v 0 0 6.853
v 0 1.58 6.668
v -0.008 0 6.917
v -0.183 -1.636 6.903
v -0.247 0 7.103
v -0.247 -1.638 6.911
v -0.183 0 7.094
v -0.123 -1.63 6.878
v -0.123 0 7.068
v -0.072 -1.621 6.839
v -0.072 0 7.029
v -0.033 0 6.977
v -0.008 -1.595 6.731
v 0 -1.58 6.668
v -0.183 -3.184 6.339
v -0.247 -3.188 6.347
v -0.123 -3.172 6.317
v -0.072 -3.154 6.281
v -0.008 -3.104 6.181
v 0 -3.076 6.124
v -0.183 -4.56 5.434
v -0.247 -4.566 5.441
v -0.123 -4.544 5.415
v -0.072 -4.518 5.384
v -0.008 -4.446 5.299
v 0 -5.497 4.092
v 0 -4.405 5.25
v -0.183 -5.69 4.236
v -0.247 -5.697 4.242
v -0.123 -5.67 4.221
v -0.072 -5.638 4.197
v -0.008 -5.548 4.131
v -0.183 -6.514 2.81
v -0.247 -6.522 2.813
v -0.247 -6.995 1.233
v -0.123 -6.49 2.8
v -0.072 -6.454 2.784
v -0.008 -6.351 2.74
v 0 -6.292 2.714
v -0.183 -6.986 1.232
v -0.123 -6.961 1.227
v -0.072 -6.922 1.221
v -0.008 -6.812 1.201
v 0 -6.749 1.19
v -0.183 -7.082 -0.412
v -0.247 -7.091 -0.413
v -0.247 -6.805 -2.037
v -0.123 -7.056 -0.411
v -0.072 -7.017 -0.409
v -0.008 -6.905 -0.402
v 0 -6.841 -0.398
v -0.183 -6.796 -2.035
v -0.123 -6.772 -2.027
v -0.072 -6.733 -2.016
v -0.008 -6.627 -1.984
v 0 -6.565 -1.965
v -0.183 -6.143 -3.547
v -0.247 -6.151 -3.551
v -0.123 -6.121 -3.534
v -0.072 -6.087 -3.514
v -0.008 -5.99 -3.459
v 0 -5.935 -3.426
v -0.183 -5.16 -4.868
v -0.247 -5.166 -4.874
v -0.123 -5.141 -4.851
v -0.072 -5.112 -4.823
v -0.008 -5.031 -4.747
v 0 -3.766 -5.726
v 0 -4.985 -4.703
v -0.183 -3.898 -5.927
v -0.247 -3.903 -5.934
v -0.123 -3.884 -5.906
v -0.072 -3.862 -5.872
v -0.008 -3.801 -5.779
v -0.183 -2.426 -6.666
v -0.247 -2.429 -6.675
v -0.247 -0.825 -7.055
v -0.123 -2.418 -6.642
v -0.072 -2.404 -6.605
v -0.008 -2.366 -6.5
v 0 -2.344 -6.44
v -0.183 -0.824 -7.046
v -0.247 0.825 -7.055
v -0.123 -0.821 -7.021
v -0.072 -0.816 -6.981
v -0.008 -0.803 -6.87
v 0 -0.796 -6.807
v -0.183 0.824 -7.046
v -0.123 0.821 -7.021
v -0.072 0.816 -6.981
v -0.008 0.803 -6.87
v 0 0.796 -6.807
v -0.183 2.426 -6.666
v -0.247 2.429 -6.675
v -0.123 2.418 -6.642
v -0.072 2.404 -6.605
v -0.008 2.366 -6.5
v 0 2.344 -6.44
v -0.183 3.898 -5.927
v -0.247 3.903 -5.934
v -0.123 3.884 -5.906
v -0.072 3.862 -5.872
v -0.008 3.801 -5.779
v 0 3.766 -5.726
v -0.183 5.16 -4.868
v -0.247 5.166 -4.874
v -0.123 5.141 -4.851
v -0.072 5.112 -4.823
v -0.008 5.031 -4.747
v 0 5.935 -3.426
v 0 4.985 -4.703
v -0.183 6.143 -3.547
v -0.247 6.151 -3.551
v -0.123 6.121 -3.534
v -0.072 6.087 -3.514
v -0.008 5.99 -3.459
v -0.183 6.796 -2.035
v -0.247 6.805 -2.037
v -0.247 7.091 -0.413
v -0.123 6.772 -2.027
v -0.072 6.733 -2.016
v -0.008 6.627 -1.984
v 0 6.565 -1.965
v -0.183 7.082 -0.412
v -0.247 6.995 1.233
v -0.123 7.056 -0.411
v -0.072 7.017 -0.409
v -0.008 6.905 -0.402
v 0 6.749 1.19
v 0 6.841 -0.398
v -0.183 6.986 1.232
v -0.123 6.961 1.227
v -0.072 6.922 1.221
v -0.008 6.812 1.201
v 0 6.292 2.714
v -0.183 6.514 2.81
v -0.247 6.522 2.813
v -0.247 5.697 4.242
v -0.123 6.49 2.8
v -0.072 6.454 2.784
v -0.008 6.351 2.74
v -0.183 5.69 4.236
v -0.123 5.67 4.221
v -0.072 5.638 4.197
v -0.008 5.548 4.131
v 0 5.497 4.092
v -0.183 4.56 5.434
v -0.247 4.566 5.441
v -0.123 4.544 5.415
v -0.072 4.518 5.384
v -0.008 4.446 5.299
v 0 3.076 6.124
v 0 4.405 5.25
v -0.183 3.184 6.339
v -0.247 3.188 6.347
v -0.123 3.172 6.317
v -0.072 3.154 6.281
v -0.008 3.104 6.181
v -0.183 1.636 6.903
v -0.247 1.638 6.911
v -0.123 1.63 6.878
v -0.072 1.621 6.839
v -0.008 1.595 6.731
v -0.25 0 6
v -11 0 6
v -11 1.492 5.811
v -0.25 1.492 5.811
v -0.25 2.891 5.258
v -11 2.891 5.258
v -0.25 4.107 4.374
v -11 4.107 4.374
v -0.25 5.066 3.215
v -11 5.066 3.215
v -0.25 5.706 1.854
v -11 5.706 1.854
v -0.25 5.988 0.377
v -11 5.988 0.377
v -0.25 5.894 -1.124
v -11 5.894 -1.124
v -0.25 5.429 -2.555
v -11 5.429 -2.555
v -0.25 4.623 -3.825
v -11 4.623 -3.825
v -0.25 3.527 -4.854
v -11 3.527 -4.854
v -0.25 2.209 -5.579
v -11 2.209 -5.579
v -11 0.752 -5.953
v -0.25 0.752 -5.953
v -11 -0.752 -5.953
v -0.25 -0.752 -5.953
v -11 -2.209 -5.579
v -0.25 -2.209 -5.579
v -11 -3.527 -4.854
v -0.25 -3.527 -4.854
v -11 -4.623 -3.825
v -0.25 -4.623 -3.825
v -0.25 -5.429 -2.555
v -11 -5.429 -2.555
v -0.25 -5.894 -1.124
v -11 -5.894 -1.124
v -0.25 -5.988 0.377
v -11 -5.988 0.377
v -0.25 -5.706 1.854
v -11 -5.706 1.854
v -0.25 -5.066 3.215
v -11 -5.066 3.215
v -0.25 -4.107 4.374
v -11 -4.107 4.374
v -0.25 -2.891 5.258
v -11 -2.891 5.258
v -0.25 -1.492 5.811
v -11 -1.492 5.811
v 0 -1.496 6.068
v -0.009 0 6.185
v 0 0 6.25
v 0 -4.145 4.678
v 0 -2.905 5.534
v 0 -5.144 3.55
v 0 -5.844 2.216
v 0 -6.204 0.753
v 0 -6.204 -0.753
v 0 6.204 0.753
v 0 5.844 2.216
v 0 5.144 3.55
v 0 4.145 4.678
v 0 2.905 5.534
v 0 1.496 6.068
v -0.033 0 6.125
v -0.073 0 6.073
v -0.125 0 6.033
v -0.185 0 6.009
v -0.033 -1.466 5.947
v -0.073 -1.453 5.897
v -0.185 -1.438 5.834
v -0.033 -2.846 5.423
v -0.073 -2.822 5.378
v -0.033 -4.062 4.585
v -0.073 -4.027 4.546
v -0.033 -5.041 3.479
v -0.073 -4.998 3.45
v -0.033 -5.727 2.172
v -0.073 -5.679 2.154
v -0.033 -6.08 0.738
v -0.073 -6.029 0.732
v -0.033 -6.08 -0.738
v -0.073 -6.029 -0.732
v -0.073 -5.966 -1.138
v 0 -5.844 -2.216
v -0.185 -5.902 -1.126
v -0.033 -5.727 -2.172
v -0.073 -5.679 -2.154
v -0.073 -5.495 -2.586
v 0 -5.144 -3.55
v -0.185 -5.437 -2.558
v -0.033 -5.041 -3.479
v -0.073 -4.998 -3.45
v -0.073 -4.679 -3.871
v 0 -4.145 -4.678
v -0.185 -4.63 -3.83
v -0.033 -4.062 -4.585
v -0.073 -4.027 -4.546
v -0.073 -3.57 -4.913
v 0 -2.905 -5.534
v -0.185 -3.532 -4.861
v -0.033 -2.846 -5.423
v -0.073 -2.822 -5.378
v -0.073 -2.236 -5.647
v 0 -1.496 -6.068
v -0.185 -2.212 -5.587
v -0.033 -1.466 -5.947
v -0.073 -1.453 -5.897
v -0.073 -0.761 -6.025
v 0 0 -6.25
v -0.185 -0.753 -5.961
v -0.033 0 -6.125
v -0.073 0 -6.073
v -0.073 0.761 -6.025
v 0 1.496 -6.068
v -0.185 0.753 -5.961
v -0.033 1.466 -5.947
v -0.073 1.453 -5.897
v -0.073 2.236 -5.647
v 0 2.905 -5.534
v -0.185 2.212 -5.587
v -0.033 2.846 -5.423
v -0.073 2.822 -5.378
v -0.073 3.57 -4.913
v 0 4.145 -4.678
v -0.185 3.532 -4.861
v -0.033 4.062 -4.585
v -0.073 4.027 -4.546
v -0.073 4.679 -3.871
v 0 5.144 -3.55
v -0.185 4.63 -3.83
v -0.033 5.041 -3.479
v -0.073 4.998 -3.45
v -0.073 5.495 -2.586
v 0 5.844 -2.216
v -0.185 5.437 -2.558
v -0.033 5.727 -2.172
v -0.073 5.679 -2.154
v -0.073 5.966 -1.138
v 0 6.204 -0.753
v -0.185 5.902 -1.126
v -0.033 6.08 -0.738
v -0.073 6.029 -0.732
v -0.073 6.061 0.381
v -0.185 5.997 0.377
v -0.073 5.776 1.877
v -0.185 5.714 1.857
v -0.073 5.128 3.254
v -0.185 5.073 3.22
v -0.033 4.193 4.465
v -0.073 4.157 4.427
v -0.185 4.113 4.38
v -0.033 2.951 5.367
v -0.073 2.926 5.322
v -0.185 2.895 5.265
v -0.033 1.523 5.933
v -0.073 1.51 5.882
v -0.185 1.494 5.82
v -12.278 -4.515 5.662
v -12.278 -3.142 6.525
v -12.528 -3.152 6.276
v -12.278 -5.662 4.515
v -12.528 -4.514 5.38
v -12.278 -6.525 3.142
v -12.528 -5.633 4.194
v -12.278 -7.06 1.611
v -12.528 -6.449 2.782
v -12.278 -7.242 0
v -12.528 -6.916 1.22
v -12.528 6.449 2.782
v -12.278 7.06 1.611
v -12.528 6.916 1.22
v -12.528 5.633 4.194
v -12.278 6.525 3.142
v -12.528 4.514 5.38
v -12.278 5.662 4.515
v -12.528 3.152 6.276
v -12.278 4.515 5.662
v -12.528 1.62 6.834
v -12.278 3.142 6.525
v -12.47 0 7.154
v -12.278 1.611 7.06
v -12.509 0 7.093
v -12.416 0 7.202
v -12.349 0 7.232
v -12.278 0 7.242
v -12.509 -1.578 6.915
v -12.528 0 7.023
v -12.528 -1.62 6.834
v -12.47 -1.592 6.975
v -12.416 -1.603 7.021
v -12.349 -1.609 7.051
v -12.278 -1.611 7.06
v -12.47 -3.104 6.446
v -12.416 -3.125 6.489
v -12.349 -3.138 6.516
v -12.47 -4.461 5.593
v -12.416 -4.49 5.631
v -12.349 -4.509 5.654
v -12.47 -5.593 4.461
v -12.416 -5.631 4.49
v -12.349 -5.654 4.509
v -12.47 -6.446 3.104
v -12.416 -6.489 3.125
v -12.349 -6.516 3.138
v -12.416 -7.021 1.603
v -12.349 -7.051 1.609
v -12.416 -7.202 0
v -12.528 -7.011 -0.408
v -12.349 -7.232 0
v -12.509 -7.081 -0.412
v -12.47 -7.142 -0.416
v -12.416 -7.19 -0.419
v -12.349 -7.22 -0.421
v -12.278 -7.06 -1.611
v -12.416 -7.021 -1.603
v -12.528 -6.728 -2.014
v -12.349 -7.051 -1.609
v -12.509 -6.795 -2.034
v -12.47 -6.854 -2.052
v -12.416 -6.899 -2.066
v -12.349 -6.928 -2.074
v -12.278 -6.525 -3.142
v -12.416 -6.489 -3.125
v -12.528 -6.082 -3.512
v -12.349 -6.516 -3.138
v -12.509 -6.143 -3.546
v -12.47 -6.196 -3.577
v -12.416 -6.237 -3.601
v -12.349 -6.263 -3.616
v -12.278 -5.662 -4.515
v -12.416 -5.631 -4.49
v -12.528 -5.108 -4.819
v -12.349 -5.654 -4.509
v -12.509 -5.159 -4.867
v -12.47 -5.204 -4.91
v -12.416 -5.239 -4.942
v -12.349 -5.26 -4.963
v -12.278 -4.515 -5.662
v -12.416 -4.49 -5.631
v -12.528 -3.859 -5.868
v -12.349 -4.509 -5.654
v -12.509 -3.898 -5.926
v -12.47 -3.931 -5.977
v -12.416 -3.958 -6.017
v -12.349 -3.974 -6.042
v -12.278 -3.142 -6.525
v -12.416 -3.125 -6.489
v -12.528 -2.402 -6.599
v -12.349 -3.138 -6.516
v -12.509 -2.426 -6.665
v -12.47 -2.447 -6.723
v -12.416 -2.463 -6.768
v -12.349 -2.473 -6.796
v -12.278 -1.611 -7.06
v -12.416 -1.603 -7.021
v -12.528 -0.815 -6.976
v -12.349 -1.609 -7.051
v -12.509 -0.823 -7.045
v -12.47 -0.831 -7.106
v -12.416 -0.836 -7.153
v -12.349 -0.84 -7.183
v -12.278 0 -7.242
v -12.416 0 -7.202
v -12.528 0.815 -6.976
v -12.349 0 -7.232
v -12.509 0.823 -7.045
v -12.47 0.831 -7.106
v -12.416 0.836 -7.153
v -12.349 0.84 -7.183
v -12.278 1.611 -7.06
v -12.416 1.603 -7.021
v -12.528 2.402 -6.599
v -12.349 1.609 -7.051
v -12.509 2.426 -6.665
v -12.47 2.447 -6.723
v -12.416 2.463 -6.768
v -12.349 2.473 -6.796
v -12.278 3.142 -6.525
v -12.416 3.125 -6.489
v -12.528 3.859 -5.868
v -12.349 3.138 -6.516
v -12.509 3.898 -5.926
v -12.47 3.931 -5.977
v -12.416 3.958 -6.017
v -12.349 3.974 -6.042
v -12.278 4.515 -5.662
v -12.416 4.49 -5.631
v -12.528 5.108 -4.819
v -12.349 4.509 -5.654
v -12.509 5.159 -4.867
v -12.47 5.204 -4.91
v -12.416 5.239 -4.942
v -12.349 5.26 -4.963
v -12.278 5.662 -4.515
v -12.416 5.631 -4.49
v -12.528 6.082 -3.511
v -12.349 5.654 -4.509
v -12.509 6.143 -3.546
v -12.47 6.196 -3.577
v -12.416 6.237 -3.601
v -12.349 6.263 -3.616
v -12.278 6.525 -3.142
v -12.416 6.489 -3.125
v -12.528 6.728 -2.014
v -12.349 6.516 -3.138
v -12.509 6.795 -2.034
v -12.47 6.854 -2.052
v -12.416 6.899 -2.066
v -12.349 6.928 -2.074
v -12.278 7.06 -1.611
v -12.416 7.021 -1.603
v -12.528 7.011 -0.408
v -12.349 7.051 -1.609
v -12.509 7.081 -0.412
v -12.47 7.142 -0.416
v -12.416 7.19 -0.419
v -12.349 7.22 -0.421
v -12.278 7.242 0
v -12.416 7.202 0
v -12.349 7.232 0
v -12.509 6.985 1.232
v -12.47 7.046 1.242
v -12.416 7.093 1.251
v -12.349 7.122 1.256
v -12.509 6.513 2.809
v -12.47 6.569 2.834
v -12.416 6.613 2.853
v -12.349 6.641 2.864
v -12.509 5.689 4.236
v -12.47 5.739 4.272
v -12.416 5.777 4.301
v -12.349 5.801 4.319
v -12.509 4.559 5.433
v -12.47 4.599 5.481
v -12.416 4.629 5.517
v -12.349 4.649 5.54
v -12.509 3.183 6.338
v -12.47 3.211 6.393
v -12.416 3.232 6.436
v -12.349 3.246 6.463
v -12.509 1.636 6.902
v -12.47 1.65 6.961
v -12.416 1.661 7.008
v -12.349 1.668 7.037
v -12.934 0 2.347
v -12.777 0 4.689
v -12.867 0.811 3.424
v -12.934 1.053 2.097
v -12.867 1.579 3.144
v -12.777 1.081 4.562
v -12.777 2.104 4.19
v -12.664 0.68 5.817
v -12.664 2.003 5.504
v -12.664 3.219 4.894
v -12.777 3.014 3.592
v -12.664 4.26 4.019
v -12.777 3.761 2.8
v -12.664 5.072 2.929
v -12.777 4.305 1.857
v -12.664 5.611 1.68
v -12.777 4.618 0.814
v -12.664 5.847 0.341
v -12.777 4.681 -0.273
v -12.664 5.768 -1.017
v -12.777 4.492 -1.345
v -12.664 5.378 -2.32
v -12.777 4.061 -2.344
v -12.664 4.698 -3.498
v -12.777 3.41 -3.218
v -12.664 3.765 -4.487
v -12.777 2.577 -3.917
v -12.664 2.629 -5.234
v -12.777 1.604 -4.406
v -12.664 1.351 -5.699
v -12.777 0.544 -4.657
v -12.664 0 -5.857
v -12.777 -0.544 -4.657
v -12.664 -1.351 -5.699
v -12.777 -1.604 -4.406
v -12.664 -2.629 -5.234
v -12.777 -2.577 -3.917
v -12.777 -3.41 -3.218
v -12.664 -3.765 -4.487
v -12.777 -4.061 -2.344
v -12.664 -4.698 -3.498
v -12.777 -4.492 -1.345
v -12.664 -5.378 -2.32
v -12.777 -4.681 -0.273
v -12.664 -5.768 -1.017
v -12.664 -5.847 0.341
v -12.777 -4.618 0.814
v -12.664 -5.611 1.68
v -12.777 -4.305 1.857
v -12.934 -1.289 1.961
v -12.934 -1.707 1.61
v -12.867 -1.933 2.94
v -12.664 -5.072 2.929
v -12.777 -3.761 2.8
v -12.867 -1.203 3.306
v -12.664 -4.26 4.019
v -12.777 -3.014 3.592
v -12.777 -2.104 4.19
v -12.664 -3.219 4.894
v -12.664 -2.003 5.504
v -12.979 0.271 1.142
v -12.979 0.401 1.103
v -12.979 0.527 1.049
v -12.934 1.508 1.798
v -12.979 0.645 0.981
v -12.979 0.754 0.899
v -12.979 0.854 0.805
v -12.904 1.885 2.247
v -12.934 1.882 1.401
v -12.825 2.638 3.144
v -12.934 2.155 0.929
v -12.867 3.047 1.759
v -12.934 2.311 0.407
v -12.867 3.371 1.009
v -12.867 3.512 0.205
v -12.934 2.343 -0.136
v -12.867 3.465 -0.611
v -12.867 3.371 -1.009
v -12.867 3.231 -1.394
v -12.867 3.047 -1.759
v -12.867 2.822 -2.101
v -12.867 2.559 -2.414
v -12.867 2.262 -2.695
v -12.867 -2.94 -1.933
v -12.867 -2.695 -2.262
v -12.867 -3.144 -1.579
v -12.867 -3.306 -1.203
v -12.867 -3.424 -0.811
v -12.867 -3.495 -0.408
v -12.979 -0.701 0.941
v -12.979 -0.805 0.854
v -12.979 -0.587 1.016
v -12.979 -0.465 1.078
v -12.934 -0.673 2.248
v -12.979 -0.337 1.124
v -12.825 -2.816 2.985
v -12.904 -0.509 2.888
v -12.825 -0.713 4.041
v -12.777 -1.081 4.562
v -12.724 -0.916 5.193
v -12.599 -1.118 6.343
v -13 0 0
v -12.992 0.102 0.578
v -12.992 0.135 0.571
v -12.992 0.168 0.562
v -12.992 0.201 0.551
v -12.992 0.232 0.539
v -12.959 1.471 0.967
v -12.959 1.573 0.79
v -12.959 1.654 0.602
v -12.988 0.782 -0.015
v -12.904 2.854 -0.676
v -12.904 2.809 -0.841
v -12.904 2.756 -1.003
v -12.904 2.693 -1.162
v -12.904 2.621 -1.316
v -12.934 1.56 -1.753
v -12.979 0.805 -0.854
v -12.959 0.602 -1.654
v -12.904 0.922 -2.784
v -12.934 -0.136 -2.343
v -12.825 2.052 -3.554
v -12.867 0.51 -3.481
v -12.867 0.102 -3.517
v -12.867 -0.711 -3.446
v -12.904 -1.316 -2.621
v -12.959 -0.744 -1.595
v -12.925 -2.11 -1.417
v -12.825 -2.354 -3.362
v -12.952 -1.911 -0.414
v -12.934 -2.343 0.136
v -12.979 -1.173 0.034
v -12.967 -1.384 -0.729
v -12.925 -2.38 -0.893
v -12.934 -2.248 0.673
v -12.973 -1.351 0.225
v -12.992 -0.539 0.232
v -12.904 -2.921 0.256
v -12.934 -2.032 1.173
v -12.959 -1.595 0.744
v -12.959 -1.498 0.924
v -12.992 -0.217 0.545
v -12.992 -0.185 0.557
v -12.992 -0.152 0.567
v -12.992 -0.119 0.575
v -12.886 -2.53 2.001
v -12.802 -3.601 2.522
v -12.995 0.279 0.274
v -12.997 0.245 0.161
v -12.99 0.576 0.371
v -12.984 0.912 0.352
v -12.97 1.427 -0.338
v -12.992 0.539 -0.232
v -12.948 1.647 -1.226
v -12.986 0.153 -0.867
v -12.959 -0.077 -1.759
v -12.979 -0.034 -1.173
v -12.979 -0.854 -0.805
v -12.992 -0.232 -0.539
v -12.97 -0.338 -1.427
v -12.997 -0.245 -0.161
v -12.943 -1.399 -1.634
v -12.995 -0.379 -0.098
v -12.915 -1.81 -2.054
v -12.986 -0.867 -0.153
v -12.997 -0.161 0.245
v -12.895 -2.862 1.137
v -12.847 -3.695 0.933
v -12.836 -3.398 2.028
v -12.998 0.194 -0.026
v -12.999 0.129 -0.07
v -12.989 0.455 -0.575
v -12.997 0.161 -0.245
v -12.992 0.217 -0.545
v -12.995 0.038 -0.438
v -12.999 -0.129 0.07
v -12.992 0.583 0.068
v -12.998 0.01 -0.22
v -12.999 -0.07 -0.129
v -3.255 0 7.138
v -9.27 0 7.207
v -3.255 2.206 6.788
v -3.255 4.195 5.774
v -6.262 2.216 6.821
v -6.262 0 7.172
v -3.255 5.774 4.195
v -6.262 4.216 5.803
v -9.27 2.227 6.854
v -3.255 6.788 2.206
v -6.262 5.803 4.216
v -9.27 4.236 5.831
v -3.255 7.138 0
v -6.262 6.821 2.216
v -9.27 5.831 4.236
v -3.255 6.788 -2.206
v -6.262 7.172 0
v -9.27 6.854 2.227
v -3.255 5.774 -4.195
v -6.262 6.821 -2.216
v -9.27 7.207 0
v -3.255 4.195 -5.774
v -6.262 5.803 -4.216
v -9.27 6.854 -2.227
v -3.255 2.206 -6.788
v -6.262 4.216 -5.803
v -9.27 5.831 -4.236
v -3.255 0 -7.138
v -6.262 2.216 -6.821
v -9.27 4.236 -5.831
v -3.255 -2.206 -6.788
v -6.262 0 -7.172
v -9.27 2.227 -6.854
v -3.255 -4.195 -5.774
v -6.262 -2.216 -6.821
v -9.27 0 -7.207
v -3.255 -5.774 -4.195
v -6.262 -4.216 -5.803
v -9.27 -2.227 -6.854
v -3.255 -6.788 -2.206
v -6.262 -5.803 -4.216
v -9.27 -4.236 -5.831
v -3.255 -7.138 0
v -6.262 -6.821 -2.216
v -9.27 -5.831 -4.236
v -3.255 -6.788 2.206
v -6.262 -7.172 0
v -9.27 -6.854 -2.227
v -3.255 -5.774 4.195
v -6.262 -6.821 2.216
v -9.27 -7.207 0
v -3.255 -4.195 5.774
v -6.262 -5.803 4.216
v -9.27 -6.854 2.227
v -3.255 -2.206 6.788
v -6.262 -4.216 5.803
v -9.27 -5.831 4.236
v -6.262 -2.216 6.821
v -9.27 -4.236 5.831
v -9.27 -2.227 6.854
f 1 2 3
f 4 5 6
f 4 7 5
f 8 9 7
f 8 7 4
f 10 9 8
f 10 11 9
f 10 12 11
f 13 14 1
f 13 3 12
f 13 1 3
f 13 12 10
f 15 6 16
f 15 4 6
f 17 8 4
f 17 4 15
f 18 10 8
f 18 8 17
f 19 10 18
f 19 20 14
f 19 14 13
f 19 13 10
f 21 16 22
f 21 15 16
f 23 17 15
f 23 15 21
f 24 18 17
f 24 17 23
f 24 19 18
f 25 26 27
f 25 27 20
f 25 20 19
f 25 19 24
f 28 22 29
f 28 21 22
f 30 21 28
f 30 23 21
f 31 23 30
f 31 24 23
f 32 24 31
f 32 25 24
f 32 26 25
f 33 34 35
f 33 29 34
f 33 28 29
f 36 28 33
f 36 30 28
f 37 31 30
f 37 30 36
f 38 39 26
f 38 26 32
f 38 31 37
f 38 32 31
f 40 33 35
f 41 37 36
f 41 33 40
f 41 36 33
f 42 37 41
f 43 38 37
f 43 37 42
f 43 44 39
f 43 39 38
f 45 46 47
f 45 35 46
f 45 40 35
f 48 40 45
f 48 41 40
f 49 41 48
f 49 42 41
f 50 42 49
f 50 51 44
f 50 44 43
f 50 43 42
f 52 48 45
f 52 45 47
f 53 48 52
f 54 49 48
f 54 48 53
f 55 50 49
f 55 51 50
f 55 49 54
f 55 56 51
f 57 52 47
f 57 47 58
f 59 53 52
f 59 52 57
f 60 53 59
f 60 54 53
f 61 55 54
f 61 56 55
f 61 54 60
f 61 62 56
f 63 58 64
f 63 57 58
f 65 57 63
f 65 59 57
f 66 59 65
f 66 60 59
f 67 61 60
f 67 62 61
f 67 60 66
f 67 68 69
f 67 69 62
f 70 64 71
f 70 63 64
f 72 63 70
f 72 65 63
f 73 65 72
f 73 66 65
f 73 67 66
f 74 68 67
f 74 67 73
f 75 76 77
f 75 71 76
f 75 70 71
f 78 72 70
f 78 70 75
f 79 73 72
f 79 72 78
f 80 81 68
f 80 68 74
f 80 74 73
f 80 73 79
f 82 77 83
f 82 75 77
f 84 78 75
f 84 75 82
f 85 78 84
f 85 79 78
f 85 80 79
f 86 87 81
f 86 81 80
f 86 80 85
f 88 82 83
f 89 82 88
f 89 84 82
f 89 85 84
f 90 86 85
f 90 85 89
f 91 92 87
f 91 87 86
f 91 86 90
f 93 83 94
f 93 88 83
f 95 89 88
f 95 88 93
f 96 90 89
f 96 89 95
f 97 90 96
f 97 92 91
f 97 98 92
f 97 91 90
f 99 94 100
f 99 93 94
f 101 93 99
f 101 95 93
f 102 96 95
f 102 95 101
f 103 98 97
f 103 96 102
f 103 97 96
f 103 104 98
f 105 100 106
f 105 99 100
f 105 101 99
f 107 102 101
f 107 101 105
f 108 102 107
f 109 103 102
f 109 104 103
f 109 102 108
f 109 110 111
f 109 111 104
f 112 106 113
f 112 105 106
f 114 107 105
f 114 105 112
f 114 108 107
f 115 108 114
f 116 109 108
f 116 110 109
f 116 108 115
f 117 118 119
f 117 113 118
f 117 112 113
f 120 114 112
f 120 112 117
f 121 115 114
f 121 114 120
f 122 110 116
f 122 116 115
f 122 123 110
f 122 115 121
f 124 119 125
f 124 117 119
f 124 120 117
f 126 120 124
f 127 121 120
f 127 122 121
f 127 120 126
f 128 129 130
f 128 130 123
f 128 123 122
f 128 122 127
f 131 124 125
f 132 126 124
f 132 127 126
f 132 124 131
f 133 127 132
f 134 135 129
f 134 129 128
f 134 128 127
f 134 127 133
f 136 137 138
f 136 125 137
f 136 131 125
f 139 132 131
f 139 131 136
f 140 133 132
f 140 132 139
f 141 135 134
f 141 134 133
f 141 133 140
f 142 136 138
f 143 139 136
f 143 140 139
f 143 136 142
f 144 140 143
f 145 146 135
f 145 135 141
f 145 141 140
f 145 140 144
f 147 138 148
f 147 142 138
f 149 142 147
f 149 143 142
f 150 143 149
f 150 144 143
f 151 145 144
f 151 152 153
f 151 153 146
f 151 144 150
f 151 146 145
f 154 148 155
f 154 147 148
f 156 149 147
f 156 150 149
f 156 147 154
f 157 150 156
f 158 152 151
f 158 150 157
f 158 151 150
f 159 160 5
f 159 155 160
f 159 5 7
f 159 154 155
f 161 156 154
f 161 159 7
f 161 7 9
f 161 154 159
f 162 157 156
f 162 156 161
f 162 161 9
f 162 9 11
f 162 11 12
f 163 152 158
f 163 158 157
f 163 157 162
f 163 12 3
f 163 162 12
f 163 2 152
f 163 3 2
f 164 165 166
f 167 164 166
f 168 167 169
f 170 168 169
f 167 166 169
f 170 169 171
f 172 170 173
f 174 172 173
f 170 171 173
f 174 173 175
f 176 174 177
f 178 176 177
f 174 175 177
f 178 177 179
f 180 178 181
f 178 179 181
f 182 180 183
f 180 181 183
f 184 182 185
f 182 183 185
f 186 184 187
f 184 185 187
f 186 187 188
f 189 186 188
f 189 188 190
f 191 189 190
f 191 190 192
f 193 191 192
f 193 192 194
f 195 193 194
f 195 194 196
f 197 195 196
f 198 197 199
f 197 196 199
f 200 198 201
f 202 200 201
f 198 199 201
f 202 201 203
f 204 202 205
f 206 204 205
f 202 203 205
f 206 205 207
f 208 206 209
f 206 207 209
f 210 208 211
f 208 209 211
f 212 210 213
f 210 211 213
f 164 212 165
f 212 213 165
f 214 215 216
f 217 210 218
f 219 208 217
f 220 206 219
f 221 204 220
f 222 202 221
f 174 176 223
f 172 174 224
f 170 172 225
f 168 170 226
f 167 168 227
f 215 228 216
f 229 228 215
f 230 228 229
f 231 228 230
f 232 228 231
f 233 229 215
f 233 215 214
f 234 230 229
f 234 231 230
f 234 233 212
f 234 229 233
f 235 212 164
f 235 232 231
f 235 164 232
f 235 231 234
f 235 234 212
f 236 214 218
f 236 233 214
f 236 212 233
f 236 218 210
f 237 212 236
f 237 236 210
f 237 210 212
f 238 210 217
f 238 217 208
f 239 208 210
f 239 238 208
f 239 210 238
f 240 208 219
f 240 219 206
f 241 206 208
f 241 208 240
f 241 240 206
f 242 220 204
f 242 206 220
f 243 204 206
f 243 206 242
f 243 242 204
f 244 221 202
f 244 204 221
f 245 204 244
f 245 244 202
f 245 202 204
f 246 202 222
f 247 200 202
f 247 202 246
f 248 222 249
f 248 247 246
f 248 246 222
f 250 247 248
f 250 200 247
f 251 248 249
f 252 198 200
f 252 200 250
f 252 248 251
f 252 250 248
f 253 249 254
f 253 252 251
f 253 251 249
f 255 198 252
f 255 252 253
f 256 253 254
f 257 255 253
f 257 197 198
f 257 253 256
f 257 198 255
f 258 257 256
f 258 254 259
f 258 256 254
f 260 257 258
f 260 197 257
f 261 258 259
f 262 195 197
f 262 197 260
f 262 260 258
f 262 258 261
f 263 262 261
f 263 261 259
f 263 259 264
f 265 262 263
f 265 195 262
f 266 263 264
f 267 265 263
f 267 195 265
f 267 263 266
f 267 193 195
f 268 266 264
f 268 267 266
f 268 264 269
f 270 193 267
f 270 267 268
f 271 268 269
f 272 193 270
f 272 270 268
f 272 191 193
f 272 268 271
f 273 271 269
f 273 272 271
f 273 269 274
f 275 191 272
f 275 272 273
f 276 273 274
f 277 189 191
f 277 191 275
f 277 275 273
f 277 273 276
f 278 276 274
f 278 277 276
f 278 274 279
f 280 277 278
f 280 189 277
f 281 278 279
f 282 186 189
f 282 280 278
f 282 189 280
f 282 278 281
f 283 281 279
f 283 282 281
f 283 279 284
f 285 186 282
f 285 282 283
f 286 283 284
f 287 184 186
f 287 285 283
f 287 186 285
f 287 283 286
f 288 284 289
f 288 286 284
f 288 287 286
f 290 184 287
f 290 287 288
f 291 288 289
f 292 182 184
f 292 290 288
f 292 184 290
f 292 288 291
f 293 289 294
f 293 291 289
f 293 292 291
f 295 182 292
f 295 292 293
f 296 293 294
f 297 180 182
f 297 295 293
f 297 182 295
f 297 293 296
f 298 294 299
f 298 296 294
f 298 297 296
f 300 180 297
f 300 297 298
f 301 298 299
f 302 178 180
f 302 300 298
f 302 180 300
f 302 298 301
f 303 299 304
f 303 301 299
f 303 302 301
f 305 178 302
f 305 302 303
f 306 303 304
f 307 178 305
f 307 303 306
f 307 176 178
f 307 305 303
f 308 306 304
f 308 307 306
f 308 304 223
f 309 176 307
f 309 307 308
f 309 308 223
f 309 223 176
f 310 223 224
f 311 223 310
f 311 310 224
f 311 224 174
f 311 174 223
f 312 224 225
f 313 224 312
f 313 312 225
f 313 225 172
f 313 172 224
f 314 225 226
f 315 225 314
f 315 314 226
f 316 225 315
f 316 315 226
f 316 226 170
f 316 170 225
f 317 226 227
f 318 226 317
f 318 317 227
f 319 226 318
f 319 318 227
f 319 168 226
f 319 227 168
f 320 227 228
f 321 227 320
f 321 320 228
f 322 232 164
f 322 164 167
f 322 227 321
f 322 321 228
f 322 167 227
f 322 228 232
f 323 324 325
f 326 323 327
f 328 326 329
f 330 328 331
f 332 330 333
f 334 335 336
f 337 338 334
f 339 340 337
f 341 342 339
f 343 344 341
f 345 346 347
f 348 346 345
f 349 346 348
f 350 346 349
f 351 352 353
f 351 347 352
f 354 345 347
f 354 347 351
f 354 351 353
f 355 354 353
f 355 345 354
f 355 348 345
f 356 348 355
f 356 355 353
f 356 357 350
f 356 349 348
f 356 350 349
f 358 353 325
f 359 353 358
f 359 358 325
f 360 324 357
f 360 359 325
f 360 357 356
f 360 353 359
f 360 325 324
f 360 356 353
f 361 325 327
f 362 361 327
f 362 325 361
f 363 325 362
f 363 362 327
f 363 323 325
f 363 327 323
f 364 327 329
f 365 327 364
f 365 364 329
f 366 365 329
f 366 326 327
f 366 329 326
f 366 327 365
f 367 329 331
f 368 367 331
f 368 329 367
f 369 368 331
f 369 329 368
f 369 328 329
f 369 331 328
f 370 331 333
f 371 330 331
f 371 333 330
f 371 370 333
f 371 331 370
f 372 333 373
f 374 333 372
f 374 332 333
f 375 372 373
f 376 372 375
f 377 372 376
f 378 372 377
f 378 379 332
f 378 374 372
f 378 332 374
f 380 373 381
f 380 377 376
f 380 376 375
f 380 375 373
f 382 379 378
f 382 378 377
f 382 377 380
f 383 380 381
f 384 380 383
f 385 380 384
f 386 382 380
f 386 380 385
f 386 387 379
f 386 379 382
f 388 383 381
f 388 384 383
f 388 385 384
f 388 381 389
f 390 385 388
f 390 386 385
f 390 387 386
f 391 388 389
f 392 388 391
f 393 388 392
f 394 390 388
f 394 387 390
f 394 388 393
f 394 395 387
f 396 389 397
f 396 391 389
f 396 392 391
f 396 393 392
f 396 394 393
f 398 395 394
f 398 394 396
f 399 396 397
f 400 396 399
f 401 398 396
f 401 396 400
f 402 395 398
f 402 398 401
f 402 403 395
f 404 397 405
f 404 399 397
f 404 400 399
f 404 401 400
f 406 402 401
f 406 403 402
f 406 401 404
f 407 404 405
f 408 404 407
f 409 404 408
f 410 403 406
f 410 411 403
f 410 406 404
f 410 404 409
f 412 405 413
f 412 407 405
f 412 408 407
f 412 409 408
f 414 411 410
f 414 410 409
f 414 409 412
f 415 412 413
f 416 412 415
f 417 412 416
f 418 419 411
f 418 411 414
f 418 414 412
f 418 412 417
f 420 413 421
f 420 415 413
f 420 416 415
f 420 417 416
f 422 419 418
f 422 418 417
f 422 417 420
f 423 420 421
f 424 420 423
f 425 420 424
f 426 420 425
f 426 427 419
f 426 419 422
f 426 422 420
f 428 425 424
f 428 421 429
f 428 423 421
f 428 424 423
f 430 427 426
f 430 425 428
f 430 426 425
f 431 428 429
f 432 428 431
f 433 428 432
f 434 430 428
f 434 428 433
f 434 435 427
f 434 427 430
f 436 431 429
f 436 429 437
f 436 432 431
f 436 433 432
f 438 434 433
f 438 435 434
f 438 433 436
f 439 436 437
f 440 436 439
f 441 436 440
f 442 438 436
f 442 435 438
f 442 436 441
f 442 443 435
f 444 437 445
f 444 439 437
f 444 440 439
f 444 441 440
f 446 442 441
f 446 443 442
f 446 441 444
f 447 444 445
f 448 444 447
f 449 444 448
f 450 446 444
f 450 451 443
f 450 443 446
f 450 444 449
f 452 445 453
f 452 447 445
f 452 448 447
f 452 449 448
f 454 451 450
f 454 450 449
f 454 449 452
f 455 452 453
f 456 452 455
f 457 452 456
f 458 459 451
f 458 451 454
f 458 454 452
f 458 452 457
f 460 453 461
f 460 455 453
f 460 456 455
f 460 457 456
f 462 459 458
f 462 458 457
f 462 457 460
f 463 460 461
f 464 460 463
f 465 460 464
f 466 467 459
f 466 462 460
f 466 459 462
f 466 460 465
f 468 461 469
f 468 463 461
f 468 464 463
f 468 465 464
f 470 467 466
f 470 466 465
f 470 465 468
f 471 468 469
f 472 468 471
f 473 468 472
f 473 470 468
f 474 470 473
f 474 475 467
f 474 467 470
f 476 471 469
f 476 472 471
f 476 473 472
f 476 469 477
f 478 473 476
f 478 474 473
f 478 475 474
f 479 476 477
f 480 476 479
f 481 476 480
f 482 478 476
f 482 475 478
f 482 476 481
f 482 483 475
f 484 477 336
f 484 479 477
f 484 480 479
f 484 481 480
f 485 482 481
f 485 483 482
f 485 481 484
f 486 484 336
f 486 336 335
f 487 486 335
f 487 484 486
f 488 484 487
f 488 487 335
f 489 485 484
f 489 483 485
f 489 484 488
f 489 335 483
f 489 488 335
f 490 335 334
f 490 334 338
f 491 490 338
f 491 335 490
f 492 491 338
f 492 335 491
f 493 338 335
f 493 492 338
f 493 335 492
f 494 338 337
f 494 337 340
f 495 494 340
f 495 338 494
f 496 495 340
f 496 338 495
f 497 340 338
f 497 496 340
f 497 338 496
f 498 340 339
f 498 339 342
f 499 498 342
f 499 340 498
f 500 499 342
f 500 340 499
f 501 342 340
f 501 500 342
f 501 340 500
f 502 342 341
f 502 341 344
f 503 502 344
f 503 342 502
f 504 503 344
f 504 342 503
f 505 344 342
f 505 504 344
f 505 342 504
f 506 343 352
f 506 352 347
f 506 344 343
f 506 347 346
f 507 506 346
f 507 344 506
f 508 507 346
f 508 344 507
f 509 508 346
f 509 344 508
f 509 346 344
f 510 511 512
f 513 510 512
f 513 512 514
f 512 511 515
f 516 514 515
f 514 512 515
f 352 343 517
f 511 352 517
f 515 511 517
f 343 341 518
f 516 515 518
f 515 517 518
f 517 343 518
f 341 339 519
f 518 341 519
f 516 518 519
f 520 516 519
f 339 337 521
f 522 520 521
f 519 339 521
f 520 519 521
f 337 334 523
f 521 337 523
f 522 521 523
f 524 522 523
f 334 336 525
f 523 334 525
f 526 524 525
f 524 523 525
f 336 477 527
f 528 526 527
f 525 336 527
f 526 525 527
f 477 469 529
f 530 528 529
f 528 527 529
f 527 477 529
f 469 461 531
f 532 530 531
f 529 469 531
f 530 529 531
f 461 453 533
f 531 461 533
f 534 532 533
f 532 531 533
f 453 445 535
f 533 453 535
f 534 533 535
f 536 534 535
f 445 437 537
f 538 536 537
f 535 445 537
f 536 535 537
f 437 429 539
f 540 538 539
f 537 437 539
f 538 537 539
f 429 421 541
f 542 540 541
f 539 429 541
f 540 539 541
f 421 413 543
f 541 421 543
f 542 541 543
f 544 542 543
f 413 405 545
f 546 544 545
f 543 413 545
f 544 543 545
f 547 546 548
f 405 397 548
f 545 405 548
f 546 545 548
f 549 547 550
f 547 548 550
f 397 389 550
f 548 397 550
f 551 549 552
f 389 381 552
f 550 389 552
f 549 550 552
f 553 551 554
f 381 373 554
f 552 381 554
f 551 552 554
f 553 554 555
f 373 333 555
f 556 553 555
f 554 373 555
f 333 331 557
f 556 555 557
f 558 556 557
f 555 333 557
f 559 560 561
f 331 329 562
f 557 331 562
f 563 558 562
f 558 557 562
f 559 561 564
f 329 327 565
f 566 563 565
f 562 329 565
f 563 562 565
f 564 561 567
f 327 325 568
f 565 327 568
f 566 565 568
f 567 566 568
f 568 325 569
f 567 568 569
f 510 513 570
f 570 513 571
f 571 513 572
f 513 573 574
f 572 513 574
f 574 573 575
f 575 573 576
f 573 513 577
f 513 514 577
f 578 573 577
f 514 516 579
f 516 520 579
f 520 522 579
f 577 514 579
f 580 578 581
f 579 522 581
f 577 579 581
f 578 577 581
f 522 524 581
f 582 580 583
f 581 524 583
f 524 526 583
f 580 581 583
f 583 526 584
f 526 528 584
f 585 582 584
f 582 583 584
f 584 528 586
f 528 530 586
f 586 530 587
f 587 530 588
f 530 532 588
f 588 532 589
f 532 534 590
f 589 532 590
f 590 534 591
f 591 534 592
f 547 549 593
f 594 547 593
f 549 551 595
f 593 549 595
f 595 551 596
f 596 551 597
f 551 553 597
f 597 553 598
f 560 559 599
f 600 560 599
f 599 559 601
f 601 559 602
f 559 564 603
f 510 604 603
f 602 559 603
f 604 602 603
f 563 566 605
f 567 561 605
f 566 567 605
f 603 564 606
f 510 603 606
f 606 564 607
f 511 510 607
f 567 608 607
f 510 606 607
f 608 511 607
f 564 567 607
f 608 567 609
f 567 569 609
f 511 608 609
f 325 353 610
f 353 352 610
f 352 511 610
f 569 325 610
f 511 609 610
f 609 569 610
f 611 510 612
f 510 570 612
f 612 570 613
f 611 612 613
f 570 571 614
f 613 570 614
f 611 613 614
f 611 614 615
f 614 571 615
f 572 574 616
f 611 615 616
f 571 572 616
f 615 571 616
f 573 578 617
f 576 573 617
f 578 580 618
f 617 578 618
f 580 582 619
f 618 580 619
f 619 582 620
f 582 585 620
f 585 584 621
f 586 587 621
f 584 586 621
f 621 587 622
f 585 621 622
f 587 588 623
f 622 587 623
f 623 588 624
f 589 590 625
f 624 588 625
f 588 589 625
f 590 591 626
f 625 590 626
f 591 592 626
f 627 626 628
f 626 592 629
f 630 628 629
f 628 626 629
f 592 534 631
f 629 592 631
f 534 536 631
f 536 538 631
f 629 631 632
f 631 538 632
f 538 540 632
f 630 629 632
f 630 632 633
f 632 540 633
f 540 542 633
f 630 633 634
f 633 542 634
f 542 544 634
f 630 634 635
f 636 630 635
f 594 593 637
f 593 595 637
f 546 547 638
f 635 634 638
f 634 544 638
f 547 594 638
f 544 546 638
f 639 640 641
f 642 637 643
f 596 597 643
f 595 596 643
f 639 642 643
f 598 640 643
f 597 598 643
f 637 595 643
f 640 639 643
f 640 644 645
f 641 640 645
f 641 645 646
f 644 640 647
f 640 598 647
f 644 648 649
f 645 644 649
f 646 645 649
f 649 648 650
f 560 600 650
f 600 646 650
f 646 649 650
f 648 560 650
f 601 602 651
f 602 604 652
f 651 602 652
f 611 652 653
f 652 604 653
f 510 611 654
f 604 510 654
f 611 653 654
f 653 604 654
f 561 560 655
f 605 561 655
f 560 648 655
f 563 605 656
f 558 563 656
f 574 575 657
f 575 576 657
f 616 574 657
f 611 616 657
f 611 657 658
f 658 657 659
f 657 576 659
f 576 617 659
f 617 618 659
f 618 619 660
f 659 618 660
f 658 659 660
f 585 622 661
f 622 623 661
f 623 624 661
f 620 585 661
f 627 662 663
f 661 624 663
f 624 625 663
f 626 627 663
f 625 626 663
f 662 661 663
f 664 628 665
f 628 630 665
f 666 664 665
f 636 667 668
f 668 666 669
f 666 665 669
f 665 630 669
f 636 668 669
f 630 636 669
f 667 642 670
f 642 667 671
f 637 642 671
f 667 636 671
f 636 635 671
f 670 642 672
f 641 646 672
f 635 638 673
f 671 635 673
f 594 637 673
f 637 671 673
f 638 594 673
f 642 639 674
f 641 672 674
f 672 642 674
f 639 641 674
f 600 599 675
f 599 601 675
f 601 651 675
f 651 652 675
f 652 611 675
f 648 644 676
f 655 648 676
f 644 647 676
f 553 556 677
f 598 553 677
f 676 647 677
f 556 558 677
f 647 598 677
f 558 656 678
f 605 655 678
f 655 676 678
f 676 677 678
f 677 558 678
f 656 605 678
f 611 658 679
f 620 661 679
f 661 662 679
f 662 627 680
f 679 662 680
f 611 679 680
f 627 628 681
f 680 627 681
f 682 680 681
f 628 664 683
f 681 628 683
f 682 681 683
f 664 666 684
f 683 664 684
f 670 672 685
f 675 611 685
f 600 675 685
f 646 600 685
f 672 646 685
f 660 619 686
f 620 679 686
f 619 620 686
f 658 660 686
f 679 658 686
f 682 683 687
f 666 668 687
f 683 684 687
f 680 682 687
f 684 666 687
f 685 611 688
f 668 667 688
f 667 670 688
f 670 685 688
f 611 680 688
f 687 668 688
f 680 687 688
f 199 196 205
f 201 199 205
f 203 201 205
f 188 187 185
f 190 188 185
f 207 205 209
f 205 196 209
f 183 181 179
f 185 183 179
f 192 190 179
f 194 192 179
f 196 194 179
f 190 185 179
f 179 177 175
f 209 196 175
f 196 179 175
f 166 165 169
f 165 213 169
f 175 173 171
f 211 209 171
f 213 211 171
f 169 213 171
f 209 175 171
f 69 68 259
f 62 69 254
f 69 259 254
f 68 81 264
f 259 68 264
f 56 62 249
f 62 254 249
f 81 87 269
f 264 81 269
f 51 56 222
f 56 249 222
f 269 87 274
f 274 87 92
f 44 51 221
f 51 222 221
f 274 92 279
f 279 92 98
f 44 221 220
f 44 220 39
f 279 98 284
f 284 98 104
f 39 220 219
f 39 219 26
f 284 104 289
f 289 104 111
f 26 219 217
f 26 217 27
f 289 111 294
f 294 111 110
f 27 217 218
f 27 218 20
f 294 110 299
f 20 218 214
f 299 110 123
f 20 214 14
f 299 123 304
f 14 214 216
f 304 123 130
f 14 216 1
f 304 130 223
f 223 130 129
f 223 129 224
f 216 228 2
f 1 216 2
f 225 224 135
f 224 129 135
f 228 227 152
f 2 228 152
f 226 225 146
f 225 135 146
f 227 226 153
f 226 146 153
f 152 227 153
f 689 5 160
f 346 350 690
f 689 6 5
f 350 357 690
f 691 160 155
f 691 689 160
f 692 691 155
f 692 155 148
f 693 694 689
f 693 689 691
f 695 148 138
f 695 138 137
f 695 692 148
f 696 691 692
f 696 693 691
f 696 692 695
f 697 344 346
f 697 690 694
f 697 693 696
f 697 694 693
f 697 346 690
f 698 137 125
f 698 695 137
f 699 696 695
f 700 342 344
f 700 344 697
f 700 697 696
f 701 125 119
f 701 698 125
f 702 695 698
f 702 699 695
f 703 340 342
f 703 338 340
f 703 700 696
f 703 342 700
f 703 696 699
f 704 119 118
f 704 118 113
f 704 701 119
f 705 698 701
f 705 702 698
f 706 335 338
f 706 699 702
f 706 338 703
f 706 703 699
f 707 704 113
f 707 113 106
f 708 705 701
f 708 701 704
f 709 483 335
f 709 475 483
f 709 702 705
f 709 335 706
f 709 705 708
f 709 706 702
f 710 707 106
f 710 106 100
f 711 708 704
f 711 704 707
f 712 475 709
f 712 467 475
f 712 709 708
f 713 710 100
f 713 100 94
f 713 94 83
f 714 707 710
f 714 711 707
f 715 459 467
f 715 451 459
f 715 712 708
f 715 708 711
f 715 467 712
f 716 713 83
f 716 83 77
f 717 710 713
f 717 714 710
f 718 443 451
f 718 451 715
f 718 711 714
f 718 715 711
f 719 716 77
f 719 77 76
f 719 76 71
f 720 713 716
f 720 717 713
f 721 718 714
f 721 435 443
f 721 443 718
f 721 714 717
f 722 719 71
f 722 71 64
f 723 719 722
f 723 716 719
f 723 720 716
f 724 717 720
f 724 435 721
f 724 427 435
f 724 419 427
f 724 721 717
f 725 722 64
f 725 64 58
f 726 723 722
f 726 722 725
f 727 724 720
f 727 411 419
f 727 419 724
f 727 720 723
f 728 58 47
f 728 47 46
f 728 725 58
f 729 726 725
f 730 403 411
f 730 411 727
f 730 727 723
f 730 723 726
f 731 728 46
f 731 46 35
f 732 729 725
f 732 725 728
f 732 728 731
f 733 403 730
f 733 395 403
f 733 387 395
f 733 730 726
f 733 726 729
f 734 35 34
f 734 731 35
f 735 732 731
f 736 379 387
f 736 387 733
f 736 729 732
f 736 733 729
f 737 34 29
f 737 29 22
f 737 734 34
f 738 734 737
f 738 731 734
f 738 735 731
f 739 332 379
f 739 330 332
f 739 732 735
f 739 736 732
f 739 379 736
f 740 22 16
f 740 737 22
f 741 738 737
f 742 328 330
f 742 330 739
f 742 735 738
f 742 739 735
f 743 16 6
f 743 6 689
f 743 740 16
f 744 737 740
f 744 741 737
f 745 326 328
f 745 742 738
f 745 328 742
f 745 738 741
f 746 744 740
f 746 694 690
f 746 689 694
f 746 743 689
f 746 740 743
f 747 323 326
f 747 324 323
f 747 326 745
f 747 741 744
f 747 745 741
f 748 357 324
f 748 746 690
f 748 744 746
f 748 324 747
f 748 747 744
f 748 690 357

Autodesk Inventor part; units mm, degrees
ref_plane "YZ Plane" through (0, 0, 0) normal (1, 0, 0) x (0, 1, 0)
ref_plane "XZ Plane" through (0, 0, 0) normal (0, 1, 0) x (-1, 0, 0)
ref_plane "XY Plane" through (0, 0, 0) normal (0, 0, 1) x (1, 0, 0)
sketch "Sketch1" plane through (0, 0, 0) normal (0, 1, 0) x (-1, 0, 0)
  line L0 (0, 0) -> (13, 0) construction
  line L1 (0.25, 6) -> (11, 6)
  line L2 (11, 6) -> (11, 0)
  line L3 (0, 6.25) -> (0, 6.8529)
  line L4 (13, 0) -> (13, 7.25) construction
  line L5 (12.2775, 7.2417) -> (0.2471, 7.1029)
  arc A0 (13, 0) -> (12.5284, 7.023) centre (-46.9979, -0.5017) ccw
  arc A1 (0.2471, 7.1029) -> (0, 6.8529) centre (0.25, 6.8529) ccw
  arc A2 (0, 6.25) -> (0.25, 6) centre (0.25, 6.25) ccw
  arc A3 (12.5284, 7.023) -> (12.2775, 7.2417) centre (12.2804, 6.9917) ccw
  line L6 (13, 0) -> (11, 0)
  point P0 (0, 6)
  point P1 (0, 7.1)
  point P2 (12.5, 7.2442)
  dimension "d0" = 13
  dimension "d1" = 11
  dimension "d2" = 6
  dimension "d3" = 1.1
  dimension "d5" = 2
  dimension "d6" = 7.25
  dimension "d7" = 60
  dimension "d8" = 0.5
  dimension "d9" = 0.25
revolve "Revolution1" add sketch "Sketch1" angle 360 about axis through (0, 0, 0) along (-1, 0, 0)
properties part number "12mm_Endcap" material "Rubber"
